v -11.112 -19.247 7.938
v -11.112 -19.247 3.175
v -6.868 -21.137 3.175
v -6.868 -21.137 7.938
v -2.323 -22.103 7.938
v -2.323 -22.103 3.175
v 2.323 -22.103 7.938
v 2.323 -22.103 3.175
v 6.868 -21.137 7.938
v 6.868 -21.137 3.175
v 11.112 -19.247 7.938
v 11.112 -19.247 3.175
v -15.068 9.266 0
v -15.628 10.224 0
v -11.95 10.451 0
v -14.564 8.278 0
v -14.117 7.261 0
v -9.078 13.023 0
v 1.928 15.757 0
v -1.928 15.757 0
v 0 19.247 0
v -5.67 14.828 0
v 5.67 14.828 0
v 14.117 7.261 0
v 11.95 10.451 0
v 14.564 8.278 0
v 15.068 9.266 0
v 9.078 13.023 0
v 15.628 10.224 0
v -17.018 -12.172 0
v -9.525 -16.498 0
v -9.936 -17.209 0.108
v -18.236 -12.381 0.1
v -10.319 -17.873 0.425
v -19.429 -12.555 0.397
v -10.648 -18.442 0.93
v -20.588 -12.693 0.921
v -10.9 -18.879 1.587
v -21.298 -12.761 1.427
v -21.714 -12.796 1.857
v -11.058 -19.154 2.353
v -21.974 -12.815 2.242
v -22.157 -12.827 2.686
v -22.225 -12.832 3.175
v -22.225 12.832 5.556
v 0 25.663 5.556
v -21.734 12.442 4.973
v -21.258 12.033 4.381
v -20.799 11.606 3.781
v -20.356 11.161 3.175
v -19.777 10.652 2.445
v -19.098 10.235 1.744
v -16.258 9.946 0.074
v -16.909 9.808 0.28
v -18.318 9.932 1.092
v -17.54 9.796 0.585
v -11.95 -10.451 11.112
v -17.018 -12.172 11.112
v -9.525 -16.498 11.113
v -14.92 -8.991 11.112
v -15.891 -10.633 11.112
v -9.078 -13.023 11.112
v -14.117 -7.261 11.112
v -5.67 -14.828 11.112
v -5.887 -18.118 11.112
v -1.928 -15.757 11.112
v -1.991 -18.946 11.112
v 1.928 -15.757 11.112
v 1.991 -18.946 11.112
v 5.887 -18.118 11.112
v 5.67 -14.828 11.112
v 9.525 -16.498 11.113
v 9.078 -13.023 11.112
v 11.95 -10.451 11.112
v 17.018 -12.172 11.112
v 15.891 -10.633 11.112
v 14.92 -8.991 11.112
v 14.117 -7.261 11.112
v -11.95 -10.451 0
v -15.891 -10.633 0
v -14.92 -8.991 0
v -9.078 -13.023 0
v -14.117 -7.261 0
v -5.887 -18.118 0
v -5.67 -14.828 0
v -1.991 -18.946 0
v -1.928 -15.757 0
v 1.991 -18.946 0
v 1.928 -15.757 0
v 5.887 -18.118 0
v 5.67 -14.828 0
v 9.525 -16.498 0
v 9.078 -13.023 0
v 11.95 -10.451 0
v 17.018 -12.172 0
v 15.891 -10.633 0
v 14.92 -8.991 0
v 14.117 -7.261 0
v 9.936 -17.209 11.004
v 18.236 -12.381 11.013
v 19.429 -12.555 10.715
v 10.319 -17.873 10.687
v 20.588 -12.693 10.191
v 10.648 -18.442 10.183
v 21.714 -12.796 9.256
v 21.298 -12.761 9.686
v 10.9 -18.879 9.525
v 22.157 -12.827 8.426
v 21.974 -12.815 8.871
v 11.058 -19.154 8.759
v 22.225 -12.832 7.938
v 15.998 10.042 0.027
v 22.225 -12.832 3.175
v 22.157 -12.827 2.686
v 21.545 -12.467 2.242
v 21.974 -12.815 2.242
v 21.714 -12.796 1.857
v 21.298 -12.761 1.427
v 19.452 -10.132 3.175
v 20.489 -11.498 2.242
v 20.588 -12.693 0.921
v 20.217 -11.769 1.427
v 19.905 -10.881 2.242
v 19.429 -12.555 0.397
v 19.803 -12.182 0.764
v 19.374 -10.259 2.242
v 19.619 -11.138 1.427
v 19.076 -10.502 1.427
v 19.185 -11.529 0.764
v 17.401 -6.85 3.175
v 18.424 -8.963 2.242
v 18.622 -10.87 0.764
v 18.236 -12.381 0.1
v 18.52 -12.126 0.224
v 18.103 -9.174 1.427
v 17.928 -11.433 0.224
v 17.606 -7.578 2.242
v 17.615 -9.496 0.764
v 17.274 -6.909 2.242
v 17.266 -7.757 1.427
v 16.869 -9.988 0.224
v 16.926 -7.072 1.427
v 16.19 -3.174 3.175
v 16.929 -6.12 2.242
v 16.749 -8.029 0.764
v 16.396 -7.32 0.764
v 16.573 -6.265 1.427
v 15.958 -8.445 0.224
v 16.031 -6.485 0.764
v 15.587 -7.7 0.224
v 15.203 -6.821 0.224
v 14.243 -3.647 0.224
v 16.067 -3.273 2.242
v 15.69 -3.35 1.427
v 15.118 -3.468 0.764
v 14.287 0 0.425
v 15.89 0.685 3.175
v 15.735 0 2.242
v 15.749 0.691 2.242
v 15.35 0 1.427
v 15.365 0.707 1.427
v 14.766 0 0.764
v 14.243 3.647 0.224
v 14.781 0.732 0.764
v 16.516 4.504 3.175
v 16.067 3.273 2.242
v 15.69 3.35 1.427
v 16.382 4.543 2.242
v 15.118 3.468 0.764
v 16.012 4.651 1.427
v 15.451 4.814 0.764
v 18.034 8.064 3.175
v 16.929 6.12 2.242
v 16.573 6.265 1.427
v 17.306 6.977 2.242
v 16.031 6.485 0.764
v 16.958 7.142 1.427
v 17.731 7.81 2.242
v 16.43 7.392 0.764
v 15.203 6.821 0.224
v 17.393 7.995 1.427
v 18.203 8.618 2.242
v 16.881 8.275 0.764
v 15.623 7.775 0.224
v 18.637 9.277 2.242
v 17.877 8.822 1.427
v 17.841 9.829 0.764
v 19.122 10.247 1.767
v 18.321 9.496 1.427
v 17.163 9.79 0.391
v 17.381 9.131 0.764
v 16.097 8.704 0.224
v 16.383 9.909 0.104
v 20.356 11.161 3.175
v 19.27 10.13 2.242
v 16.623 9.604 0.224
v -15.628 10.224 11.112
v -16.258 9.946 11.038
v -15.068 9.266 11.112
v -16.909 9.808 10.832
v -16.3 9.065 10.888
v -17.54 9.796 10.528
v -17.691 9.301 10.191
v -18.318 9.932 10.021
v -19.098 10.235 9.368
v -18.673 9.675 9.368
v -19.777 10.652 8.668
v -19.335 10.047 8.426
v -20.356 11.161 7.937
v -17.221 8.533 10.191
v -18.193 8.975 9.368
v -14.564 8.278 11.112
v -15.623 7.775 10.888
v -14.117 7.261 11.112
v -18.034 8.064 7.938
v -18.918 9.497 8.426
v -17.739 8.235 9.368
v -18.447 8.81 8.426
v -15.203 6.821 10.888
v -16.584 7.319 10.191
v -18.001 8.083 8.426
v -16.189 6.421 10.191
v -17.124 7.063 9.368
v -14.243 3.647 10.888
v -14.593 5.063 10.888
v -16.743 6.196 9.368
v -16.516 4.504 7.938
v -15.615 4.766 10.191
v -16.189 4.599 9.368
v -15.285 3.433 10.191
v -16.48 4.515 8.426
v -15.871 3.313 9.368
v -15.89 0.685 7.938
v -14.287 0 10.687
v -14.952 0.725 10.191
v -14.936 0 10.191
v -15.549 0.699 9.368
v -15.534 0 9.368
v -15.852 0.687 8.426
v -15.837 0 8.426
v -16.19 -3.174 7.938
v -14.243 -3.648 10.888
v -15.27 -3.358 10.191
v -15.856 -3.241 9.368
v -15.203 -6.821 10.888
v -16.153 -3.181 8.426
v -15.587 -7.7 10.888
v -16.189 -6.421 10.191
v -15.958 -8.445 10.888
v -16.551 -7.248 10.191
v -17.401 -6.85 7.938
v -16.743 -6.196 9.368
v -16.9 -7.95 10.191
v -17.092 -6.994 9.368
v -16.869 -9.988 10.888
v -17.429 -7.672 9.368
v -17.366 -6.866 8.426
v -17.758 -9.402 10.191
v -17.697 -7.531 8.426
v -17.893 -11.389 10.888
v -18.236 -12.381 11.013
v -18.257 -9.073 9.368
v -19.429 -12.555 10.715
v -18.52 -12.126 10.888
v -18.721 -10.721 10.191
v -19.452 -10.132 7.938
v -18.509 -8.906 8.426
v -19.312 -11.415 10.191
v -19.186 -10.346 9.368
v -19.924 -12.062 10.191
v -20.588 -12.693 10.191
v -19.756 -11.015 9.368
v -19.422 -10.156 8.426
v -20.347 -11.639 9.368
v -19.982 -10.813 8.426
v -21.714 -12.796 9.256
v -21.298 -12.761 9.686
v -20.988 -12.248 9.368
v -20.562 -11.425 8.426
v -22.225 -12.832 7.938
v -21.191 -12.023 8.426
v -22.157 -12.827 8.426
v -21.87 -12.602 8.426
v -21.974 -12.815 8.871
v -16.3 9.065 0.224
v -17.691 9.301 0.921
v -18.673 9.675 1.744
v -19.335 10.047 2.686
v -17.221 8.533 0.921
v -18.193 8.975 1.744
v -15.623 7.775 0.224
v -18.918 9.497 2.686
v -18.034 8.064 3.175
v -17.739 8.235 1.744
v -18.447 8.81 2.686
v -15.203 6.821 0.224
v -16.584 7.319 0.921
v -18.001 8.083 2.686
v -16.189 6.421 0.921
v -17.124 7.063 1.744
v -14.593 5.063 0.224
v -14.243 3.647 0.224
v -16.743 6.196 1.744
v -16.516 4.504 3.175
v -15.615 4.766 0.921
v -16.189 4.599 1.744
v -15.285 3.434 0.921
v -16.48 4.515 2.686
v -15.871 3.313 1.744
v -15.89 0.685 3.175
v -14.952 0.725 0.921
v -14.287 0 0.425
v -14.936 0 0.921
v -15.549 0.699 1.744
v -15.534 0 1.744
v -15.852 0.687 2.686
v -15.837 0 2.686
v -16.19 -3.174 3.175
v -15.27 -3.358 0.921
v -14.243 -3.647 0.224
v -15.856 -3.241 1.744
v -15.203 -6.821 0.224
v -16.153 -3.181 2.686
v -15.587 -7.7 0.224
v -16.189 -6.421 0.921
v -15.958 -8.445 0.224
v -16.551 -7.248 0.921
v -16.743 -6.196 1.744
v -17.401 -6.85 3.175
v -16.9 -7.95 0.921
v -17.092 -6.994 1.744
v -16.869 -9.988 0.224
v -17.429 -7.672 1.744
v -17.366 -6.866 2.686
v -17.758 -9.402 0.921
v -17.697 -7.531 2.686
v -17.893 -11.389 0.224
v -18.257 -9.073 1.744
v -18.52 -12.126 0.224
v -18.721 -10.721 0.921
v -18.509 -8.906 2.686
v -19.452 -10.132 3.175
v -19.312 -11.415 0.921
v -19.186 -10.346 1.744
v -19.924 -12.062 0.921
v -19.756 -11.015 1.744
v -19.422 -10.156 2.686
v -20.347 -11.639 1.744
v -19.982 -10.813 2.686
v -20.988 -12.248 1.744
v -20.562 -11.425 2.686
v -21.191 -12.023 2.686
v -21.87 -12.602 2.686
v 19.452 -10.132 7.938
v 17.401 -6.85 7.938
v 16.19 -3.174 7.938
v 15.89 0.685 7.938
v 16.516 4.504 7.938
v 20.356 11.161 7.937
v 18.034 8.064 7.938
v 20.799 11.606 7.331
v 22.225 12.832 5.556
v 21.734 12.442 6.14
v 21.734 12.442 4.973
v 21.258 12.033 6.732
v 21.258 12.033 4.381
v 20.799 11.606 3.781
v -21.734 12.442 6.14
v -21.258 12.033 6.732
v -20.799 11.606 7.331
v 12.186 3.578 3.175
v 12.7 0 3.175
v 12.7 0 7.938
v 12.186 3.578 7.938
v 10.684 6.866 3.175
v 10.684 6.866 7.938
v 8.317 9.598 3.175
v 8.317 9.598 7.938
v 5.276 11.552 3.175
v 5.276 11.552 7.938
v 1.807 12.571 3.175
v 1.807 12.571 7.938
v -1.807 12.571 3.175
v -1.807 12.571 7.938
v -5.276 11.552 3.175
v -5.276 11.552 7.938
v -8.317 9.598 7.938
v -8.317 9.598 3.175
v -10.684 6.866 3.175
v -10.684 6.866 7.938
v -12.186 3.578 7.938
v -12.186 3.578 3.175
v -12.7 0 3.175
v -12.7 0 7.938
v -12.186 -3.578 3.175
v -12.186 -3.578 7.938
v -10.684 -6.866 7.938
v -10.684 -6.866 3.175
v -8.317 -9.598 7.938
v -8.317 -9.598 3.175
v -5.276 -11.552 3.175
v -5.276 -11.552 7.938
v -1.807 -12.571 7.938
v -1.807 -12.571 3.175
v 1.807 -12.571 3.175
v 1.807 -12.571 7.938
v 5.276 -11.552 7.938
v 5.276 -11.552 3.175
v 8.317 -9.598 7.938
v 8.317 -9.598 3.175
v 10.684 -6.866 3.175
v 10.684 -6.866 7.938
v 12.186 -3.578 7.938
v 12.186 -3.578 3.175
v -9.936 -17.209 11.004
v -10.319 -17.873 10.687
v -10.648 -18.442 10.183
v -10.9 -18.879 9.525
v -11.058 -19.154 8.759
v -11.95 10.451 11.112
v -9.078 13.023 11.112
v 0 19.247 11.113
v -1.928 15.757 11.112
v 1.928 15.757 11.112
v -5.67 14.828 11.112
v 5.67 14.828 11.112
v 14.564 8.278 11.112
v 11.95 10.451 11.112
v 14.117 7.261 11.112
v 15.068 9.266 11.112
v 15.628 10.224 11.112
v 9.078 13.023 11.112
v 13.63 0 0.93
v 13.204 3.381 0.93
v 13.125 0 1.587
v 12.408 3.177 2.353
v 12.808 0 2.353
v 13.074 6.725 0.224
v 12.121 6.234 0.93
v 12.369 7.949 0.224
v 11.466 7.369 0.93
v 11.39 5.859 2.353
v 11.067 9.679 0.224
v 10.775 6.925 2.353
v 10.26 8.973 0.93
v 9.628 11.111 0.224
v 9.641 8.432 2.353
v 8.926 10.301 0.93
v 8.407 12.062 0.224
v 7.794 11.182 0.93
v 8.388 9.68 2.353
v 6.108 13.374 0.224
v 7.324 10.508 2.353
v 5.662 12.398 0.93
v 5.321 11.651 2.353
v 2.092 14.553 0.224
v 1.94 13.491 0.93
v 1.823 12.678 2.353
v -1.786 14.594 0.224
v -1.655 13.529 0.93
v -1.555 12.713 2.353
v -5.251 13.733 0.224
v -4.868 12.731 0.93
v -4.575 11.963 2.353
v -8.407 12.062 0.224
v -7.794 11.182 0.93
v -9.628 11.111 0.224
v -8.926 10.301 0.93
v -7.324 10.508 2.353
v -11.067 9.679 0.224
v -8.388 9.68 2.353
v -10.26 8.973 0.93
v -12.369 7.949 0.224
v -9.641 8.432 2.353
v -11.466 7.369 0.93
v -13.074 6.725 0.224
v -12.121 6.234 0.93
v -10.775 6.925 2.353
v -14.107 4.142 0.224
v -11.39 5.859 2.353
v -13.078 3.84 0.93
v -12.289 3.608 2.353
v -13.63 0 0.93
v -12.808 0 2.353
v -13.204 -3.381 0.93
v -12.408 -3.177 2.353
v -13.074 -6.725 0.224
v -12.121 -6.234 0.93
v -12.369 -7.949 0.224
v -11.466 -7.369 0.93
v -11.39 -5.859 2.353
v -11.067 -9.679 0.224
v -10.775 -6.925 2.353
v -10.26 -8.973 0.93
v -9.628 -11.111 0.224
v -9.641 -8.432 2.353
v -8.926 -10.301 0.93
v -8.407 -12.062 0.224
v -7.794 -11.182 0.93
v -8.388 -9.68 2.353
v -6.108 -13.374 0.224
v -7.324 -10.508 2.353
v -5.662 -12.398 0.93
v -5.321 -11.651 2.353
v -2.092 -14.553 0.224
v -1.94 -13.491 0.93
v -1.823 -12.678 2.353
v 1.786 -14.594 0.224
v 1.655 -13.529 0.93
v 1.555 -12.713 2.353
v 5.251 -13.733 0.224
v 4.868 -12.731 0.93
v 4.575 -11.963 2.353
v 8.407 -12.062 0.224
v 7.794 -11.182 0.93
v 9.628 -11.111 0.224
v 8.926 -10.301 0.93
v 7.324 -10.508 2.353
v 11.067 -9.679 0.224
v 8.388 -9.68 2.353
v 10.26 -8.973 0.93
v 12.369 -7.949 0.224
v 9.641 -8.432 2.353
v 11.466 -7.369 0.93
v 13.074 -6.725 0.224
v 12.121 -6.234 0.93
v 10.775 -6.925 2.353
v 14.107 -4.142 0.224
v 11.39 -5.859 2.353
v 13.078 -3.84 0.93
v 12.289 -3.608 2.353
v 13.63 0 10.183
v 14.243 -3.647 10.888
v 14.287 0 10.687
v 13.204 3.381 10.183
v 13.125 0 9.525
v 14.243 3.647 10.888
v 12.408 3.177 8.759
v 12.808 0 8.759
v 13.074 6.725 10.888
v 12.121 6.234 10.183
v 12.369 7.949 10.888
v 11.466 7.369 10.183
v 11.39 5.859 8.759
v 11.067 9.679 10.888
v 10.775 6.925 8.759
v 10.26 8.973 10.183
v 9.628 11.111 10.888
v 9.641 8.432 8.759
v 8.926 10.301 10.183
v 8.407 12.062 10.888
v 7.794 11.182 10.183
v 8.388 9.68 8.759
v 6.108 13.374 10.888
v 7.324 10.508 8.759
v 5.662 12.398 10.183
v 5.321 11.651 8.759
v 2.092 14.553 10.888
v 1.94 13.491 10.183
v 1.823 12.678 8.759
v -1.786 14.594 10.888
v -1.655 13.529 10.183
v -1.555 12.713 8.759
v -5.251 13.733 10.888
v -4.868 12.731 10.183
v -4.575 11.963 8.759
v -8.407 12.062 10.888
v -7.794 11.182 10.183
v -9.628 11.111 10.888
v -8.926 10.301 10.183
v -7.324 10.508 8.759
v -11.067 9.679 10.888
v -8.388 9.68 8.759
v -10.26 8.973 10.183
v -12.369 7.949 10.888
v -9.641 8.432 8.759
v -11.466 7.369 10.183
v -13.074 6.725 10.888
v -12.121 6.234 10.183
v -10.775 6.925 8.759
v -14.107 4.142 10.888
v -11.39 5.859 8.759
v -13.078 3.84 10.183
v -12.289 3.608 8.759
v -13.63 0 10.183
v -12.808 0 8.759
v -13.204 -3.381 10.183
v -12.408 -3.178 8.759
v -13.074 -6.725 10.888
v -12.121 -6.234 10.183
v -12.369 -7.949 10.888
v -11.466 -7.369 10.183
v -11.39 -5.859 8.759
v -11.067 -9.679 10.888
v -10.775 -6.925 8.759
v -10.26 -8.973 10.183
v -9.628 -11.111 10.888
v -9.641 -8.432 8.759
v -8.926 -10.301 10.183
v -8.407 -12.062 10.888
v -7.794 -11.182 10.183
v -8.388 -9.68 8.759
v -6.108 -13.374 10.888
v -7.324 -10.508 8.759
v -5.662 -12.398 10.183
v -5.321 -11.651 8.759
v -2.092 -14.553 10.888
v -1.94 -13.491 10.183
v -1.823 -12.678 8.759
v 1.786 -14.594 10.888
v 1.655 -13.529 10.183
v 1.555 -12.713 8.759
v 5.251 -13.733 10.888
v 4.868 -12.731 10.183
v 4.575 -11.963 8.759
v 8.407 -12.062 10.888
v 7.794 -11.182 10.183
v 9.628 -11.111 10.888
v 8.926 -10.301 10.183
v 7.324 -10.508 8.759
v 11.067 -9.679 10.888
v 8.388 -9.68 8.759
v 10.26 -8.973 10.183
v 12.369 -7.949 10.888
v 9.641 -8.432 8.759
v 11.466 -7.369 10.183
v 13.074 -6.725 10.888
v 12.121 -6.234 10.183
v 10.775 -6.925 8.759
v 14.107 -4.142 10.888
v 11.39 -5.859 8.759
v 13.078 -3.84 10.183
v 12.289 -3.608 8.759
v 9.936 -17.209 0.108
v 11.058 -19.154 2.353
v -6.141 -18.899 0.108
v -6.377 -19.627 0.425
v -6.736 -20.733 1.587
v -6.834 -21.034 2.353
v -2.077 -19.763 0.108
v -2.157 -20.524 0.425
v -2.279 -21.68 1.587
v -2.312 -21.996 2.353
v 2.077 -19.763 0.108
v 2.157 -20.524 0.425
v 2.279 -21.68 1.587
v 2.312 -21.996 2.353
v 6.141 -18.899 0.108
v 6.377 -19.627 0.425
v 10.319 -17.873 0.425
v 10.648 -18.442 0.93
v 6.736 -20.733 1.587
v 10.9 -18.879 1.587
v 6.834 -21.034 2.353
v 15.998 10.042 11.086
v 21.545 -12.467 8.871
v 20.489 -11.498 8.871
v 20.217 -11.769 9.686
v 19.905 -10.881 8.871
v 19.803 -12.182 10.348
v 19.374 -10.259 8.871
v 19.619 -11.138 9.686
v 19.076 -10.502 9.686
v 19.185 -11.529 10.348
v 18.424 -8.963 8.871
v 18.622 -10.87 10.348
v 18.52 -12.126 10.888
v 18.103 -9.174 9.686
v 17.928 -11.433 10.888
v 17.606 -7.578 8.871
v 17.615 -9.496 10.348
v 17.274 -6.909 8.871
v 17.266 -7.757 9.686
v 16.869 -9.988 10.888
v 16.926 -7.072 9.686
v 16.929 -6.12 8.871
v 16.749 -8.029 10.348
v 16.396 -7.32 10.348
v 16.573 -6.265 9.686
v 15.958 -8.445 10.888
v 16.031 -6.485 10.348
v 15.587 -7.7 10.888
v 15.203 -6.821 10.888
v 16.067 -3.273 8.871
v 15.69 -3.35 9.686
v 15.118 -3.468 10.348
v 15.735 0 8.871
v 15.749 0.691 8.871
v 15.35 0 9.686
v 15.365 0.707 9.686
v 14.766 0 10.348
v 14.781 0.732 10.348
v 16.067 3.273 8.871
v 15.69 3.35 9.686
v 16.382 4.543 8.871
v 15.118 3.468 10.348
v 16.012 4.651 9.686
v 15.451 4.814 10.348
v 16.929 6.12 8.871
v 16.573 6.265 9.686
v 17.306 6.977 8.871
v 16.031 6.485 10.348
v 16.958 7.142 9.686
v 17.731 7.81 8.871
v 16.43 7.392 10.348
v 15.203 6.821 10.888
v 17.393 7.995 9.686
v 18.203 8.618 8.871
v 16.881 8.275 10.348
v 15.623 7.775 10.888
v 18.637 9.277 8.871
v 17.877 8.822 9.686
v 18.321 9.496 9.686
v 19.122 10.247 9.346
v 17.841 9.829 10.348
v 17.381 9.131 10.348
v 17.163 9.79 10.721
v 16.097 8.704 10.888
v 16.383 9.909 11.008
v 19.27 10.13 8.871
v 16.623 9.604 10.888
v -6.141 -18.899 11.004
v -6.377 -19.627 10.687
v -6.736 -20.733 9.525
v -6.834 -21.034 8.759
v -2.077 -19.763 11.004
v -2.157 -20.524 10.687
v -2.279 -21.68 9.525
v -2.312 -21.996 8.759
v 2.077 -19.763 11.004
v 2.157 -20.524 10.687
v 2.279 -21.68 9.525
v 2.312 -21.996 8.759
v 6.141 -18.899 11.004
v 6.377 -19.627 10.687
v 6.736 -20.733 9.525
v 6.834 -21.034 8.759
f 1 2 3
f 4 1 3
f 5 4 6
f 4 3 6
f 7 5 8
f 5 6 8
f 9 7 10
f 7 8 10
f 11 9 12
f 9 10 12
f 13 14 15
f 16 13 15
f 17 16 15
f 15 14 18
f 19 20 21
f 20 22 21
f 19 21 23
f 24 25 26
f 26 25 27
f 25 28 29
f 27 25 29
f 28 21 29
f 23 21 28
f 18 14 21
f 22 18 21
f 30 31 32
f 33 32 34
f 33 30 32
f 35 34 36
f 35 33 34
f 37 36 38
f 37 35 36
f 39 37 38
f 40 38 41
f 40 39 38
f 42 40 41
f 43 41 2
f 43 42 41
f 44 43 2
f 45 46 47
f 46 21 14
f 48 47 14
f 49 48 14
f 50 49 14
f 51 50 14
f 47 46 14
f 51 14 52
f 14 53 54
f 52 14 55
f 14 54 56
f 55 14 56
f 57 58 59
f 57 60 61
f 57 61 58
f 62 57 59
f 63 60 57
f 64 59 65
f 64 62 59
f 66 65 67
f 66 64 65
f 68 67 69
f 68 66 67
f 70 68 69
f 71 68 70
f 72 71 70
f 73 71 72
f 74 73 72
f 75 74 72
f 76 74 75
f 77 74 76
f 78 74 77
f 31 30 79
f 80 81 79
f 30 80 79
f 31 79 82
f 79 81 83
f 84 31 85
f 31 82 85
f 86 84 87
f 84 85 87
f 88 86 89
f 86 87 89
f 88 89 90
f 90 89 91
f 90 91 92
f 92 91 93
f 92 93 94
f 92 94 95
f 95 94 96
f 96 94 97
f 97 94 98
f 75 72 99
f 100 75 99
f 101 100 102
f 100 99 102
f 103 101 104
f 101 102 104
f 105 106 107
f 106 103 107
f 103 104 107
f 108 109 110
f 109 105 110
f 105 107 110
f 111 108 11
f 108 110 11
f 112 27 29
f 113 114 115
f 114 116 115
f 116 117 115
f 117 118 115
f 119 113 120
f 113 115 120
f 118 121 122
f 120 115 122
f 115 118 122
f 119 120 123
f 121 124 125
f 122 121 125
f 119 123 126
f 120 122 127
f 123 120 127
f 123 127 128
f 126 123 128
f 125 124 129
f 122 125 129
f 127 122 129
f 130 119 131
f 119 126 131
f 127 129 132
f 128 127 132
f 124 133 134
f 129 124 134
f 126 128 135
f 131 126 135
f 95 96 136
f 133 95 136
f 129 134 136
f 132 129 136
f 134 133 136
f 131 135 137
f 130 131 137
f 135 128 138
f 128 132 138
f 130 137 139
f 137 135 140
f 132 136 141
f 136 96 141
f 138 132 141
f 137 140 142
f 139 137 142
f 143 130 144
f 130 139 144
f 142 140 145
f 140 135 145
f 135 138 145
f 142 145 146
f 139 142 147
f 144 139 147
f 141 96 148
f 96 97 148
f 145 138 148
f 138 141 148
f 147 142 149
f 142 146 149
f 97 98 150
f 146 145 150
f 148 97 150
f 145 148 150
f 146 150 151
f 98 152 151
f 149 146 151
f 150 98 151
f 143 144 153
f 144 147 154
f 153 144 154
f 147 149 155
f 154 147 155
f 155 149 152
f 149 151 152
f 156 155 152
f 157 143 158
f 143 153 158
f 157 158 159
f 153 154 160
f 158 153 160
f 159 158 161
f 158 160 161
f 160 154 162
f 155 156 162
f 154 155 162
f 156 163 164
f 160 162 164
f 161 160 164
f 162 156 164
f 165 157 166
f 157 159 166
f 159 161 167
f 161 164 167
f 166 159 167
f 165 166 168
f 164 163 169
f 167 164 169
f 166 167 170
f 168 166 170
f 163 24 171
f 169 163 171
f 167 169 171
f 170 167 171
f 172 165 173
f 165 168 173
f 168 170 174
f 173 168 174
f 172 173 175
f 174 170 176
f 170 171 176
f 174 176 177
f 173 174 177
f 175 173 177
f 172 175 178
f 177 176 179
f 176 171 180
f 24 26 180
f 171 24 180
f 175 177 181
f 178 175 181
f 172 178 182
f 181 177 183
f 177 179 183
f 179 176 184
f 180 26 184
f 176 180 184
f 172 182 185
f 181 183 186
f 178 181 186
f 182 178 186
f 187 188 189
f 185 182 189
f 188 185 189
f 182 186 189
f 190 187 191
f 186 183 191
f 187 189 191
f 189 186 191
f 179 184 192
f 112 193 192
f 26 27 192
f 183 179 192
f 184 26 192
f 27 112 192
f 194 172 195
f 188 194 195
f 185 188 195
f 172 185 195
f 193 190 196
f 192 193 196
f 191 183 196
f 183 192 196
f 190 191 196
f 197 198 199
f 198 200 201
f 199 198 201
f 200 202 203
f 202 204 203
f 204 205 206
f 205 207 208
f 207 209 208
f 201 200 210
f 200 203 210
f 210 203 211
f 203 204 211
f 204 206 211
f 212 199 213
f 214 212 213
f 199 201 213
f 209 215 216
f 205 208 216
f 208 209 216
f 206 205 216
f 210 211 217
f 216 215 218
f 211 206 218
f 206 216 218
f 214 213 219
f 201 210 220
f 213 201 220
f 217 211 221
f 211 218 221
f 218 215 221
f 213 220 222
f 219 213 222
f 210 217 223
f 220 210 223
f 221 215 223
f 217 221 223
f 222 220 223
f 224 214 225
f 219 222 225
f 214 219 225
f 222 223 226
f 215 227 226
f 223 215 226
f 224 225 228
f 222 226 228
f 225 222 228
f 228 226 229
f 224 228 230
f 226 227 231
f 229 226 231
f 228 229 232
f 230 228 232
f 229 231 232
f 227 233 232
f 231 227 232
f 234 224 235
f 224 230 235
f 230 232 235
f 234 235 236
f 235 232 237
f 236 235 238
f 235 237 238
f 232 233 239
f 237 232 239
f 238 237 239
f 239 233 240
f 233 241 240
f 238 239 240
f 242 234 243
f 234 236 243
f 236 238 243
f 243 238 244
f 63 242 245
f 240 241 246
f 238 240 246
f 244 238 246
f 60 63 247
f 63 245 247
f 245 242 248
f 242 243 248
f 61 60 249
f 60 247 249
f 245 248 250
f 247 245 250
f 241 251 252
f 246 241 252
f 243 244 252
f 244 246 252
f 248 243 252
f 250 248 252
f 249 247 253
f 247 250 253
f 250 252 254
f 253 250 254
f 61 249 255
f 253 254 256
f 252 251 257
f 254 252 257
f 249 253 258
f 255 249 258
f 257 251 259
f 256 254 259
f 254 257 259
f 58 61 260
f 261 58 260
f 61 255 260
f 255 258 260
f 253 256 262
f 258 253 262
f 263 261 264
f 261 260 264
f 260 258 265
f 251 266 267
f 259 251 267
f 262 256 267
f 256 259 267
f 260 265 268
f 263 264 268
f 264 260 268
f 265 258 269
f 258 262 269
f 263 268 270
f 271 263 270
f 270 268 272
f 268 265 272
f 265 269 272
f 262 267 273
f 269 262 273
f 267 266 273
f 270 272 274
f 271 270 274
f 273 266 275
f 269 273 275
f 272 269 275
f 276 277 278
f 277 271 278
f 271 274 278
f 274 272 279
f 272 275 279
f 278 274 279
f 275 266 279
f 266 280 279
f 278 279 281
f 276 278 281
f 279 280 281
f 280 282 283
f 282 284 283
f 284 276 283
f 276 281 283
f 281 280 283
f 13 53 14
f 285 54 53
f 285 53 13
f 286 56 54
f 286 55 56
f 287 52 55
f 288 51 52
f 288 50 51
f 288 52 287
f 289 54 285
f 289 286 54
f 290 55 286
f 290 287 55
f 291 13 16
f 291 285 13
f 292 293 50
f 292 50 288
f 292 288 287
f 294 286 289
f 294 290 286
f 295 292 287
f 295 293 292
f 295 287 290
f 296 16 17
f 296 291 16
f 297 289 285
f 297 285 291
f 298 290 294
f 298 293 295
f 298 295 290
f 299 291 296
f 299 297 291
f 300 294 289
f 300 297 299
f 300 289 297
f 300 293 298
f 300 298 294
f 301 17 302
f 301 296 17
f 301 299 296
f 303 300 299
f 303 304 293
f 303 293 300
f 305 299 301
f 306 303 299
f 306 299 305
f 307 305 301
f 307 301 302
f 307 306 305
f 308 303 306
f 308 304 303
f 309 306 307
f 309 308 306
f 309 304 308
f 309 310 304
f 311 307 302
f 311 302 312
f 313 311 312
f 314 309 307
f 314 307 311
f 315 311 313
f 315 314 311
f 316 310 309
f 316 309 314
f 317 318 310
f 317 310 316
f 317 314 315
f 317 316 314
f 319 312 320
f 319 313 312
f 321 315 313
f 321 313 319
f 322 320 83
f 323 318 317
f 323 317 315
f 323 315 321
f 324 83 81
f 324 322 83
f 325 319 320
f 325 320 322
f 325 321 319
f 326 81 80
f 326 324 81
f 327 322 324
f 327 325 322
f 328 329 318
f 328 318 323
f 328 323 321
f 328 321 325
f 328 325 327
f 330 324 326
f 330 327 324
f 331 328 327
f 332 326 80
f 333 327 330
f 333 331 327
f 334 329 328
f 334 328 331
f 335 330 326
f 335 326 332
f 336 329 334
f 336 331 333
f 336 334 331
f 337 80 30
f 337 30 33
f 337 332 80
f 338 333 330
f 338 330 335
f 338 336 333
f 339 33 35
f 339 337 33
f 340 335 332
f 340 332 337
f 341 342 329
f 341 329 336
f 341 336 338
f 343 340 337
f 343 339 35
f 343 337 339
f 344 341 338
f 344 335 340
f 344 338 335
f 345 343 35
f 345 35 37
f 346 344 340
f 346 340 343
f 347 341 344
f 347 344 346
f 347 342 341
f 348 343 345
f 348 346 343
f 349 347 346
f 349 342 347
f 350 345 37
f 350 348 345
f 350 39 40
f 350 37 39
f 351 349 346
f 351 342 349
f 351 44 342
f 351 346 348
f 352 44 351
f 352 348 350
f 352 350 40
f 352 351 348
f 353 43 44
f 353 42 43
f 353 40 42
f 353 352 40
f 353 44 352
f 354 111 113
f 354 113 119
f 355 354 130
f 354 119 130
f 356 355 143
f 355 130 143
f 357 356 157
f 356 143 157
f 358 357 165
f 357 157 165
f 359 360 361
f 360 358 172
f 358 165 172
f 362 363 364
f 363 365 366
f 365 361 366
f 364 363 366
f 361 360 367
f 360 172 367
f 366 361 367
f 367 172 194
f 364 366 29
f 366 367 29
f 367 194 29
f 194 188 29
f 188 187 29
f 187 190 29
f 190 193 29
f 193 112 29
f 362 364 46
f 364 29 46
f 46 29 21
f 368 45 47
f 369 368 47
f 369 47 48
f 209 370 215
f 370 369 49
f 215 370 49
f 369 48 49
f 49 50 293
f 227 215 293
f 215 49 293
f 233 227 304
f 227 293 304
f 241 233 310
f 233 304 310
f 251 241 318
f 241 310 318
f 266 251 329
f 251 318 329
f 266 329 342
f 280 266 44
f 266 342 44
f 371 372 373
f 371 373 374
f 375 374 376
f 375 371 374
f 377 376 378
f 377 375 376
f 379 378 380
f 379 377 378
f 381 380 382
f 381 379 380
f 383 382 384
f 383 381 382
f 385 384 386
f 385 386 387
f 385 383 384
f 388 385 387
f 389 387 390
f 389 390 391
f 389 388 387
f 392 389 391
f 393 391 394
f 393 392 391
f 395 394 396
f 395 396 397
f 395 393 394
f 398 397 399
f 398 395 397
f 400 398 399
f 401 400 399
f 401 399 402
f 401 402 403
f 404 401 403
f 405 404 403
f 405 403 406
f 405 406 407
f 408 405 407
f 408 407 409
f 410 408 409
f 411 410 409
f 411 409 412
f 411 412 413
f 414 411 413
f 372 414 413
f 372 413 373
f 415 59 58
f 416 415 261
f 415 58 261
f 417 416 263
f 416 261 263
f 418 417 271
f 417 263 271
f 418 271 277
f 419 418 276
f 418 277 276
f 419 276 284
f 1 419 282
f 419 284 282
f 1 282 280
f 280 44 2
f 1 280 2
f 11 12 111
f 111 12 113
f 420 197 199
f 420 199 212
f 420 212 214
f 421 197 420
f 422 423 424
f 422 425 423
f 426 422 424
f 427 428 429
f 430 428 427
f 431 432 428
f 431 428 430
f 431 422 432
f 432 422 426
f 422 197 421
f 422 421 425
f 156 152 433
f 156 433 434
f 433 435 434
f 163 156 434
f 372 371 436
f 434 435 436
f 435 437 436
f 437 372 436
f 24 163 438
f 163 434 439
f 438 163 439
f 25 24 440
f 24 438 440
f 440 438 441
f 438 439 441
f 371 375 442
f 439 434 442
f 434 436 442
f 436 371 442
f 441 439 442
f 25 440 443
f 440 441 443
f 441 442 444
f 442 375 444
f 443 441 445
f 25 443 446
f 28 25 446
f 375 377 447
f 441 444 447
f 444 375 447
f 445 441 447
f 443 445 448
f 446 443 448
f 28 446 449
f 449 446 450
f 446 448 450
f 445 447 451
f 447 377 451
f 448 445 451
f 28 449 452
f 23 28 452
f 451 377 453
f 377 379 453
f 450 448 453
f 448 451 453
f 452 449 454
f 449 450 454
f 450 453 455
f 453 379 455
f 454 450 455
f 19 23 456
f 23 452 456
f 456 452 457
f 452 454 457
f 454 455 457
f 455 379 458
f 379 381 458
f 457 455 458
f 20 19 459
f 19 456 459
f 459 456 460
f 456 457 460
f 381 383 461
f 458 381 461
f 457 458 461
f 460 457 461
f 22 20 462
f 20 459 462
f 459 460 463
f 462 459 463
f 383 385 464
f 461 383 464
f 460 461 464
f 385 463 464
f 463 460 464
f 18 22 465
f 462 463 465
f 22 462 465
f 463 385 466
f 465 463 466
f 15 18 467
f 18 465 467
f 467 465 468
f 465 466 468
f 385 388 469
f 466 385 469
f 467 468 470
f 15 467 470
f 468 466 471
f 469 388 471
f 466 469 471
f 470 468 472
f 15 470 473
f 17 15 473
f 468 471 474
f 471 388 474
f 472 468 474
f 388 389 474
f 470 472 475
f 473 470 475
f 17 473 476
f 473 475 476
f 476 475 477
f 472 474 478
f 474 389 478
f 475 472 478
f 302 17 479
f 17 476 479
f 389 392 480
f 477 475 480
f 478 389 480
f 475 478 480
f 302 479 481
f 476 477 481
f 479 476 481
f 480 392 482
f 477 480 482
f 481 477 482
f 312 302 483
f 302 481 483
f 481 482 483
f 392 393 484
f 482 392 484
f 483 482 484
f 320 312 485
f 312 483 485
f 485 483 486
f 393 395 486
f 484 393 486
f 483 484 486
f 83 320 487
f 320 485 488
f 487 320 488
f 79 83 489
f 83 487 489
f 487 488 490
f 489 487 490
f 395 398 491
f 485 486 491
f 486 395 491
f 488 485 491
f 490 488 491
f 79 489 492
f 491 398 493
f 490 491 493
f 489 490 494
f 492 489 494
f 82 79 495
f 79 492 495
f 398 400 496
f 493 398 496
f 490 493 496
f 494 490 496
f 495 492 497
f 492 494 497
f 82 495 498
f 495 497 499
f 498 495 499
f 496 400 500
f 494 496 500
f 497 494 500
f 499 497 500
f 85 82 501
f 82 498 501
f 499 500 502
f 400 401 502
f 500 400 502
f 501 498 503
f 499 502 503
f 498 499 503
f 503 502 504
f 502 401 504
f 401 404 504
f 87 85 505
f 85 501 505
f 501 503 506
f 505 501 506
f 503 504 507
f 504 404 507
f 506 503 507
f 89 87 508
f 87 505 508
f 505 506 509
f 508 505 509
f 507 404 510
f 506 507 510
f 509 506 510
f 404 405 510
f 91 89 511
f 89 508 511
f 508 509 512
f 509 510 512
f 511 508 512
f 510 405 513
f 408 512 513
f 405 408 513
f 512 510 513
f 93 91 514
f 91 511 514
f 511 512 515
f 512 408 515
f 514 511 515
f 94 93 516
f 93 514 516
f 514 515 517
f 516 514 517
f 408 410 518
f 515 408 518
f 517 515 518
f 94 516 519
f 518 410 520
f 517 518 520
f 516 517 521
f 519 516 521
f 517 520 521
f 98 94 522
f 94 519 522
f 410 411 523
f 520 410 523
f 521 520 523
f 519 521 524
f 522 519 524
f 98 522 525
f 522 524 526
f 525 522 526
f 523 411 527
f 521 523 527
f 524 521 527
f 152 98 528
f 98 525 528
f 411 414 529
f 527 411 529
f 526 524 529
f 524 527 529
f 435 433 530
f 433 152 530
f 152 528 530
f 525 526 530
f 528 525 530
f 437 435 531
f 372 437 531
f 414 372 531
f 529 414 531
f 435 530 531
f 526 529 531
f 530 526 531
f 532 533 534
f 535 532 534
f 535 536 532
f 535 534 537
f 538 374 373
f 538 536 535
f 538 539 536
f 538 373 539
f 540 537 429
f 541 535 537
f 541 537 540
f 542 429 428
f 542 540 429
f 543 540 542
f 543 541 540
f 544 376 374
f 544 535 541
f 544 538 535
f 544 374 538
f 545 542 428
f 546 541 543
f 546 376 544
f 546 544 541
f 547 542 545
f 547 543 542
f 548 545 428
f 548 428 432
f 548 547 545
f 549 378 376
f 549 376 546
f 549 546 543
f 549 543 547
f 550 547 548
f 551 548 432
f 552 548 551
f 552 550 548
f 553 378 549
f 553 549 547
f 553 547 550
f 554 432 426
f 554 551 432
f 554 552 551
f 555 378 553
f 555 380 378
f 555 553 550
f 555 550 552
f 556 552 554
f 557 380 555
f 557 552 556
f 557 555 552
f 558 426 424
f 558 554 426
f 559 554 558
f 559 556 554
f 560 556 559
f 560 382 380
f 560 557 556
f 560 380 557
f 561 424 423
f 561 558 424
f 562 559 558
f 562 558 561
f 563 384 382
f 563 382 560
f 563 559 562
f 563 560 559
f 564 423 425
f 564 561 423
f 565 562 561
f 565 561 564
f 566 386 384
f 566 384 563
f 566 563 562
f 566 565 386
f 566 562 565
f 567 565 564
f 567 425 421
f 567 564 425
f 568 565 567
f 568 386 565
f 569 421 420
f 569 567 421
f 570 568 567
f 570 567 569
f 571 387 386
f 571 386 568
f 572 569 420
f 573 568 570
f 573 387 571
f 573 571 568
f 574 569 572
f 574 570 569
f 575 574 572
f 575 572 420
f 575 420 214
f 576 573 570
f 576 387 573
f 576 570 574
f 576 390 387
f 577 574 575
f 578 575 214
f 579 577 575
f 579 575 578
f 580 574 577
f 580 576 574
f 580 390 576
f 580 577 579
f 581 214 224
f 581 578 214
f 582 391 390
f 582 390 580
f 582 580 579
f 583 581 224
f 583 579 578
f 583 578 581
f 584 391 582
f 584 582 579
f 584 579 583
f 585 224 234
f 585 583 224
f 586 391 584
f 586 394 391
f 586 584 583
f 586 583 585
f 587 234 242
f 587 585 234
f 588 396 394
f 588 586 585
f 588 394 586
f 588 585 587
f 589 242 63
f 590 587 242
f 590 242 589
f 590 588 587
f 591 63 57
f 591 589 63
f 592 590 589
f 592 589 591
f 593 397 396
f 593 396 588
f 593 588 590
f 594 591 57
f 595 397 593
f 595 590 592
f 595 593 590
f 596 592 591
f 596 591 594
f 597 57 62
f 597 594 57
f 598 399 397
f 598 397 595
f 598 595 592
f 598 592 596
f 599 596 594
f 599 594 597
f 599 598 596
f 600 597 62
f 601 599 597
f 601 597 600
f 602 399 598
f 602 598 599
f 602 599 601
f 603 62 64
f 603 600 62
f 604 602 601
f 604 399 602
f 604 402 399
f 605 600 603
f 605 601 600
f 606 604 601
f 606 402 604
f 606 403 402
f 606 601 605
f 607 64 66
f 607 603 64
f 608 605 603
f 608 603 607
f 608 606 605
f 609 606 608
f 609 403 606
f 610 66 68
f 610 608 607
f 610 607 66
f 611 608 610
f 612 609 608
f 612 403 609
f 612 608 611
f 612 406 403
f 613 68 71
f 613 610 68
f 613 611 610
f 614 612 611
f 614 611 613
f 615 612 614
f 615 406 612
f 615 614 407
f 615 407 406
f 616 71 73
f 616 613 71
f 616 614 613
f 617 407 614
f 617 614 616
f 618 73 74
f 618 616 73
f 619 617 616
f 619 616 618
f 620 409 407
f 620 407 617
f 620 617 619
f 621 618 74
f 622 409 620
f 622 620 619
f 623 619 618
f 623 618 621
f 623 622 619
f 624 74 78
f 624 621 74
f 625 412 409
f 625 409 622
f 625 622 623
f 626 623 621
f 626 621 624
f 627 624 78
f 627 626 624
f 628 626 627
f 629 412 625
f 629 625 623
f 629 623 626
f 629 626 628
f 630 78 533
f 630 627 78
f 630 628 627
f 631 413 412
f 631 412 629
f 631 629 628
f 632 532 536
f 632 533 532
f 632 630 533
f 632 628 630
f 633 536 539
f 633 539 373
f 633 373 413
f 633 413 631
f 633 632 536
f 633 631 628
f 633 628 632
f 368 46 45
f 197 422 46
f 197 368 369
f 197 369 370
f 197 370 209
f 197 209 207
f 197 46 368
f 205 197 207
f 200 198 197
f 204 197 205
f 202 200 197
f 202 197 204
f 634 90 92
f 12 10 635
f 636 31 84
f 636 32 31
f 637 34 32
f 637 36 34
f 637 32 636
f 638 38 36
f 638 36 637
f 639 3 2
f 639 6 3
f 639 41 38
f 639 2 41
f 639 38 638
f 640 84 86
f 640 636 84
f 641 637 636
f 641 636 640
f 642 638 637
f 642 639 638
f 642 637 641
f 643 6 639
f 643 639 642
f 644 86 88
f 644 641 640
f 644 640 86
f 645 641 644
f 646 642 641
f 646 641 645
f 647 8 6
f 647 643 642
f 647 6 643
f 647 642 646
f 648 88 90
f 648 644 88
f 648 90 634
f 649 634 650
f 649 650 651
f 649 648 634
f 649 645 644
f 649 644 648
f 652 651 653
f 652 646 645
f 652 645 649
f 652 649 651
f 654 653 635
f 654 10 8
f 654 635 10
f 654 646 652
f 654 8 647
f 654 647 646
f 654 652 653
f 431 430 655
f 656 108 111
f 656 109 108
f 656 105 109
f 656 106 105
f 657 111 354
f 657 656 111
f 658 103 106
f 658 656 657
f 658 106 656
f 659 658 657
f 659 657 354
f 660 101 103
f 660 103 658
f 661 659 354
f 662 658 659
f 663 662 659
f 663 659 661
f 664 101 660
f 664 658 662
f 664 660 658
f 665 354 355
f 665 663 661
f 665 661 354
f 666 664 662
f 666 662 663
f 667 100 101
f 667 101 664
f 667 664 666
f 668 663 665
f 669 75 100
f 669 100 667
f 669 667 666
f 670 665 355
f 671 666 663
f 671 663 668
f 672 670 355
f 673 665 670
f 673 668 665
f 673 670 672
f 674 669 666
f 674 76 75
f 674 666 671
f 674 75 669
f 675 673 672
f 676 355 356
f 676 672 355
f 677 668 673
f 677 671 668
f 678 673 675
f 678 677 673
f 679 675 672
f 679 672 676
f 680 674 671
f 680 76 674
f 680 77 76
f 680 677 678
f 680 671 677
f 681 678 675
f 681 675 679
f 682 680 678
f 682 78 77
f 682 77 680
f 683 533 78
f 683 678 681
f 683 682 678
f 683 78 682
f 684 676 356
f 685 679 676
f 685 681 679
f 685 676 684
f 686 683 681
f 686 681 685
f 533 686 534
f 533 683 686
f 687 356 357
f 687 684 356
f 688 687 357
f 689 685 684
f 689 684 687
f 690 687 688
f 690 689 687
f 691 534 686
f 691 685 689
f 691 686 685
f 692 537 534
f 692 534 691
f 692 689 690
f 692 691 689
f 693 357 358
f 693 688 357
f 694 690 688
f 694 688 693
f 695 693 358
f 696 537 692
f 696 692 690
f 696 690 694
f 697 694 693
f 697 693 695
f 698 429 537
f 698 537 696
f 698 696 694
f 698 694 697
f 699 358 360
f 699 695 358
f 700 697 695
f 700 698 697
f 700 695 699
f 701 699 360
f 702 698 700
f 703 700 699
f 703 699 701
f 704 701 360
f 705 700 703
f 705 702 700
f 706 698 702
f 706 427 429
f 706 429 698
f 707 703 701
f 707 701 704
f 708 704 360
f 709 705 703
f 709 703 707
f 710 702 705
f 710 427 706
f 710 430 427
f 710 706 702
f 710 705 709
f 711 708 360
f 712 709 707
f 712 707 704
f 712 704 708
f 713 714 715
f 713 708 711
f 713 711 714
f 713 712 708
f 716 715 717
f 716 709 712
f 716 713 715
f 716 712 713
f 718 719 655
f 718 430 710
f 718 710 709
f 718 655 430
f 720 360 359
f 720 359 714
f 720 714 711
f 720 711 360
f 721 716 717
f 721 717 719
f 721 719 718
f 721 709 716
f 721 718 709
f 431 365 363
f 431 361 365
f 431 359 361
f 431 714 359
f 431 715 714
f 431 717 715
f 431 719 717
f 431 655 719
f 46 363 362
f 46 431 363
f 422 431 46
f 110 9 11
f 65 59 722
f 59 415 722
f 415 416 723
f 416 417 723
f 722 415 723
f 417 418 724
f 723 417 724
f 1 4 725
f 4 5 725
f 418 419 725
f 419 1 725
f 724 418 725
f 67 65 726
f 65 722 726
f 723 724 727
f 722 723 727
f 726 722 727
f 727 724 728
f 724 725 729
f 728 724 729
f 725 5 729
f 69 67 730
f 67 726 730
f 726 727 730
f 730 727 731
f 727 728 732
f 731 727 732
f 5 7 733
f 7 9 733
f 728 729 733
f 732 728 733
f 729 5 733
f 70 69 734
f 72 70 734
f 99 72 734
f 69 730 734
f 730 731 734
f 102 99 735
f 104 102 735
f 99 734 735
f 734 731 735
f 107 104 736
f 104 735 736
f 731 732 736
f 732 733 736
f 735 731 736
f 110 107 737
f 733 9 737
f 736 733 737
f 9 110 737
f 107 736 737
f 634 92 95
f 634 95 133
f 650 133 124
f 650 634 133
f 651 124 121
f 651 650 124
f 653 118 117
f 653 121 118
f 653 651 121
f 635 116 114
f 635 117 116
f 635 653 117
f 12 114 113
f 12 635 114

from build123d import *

# Parameters (mm, degrees)
F0_R         = 12.7
F1_DEPTH     = 11.1125
F2_SIZE      = 5.55624
F3_T1_DEPTH  = 20.7691097327
F3_T3_DEPTH  = 20.7691097327
F3_T10_ANGLE = 141.384588939
F3_T12_ANGLE = 141.384588939
F3_T14_ANGLE = 60
F3_T16_ANGLE = 60
F3_T18_ANGLE = 141.384588939
F3_T20_ANGLE = 141.384588939


# Not quite as in the source:
# - a fillet or chamfer that OpenCascade refuses, or shapes differently, is made with other operations: its cross-section is extruded or revolved along the edge and cut away or added
# - a fillet or chamfer is up to 0.001 mm smaller than in the source, because OpenCascade refuses the exact size


with BuildPart() as f1:
    # F0 (on Top) → F1 (new body)
    with BuildSketch(Plane.XY):
        with BuildLine():
            Line((0, 25.6632194655), (-22.225, 12.8316097327))
            ThreePointArc((-22.225, 12.8316097327), (-15.875, 0), (-22.225, -12.8316097327))
            Line((-22.225, -12.8316097327), (-11.1125, -19.2474145991))
            ThreePointArc((-11.1125, -19.2474145991), (0, -22.225), (11.1125, -19.2474145991))
            Line((11.1125, -19.2474145991), (22.225, -12.8316097327))
            ThreePointArc((22.225, -12.8316097327), (15.875, 0), (22.225, 12.8316097327))
            Line((22.225, 12.8316097327), (0, 25.6632194655))
        make_face()
        Circle(F0_R, mode=Mode.SUBTRACT)
    extrude(amount=F1_DEPTH)

    # F2 (size 5.55625 in the source; OpenCascade refuses exactly that, so slightly less here)
    f2_edges = [f1.edges().sort_by_distance(p)[0] for p in [
        (11.1125, 19.247415, 0),
        (11.1125, 19.247415, 11.1125),
        (-11.1125, 19.247415, 11.1125),
        (-11.1125, 19.247415, 0),
    ]]
    chamfer(f2_edges, length=F2_SIZE)

    # F3: fillet of radius 3.175 on 13 edges, made by hand

    # F3_s2 → F3_t1 (cut)
    with BuildSketch(Plane(origin=(-17.9865766425, 10.3845548664, 0), x_dir=(0, 0, 1), z_dir=(0.8660254038, -0.5, 0))):
        with BuildLine():
            ThreePointArc((11.1125, 19.05), (10.1825640303, 21.2950640303), (7.9375, 22.225))
            Line((7.9375, 22.225), (11.1125, 22.225))
            Line((11.1125, 22.225), (11.1125, 19.05))
        make_face()
        with BuildLine():
            ThreePointArc((0, 19.05), (0.9299359697, 21.2950640303), (3.175, 22.225))
            Line((3.175, 22.225), (0, 22.225))
            Line((0, 22.225), (0, 19.05))
        make_face()
    extrude(amount=F3_T1_DEPTH, mode=Mode.SUBTRACT)

    # F3_s4 → F3_t3 (cut)
    with BuildSketch(Plane(origin=(0, 0, 0), x_dir=(0, 0, 1), z_dir=(0.8660254038, 0.5, 0))):
        with BuildLine():
            ThreePointArc((0, 19.05), (0.9299359697, 21.2950640303), (3.175, 22.225))
            Line((3.175, 22.225), (0, 22.225))
            Line((0, 22.225), (0, 19.05))
        make_face()
        with BuildLine():
            ThreePointArc((11.1125, 19.05), (10.1825640303, 21.2950640303), (7.9375, 22.225))
            Line((7.9375, 22.225), (11.1125, 22.225))
            Line((11.1125, 22.225), (11.1125, 19.05))
        make_face()
    extrude(amount=F3_T3_DEPTH, mode=Mode.SUBTRACT)

    # F3_s5 → F3_t6 (revolve, cut)
    with BuildSketch(Plane.XZ):
        with BuildLine():
            ThreePointArc((15.875, 0), (13.6299359697, 0.9299359697), (12.7, 3.175))
            Line((12.7, 3.175), (12.7, 0))
            Line((12.7, 0), (15.875, 0))
        make_face()
    revolve(axis=Axis((0, 0, 0), (0, 0, 1)), mode=Mode.SUBTRACT)

    # F3_s7 → F3_t8 (revolve, cut)
    with BuildSketch(Plane.XZ):
        with BuildLine():
            ThreePointArc((15.875, 11.1125), (13.6299359697, 10.1825640303), (12.7, 7.9375))
            Line((12.7, 7.9375), (12.7, 11.1125))
            Line((12.7, 11.1125), (15.875, 11.1125))
        make_face()
    revolve(axis=Axis((0, 0, 11.1125), (0, 0, 1)), mode=Mode.SUBTRACT)

    # F3_s9 → F3_t10 (revolve, cut)
    with BuildSketch(Plane(origin=(-24.2694814431, 13.7102008228, 0), x_dir=(0, 0, 1), z_dir=(-0.8706754951, 0.4918578882, 0))):
        with BuildLine():
            ThreePointArc((11.1125, 3.567957984), (10.1825640303, 1.3228939538), (7.9375, 0.392957984))
            Line((7.9375, 0.392957984), (11.1125, 0.392957984))
            Line((11.1125, 0.392957984), (11.1125, 3.567957984))
        make_face()
    revolve(axis=Axis((-32.0145833333, 0, 11.1125), (0, 0, -1)), revolution_arc=F3_T10_ANGLE, mode=Mode.SUBTRACT)

    # F3_s11 → F3_t12 (revolve, cut)
    with BuildSketch(Plane(origin=(-24.2694814431, 13.7102008228, 0), x_dir=(0, 0, 1), z_dir=(-0.8706754951, 0.4918578882, 0))):
        with BuildLine():
            ThreePointArc((0, 3.567957984), (0.9299359697, 1.3228939538), (3.175, 0.392957984))
            Line((3.175, 0.392957984), (0, 0.392957984))
            Line((0, 0.392957984), (0, 3.567957984))
        make_face()
    revolve(axis=Axis((-32.0145833333, 0, 0), (0, 0, -1)), revolution_arc=F3_T12_ANGLE, mode=Mode.SUBTRACT)

    # F3_s13 → F3_t14 (revolve, cut)
    with BuildSketch(Plane(origin=(0, 0, 0), x_dir=(0, 0, 1), z_dir=(-0.8660254038, 0.5, 0))):
        with BuildLine():
            ThreePointArc((11.1125, -19.05), (10.1825640303, -21.2950640303), (7.9375, -22.225))
            Line((7.9375, -22.225), (11.1125, -22.225))
            Line((11.1125, -22.225), (11.1125, -19.05))
        make_face()
    revolve(axis=Axis((0, 0, 11.1125), (0, 0, 1)), revolution_arc=F3_T14_ANGLE, mode=Mode.SUBTRACT)

    # F3_s15 → F3_t16 (revolve, cut)
    with BuildSketch(Plane(origin=(0, 0, 0), x_dir=(0, 0, 1), z_dir=(-0.8660254038, 0.5, 0))):
        with BuildLine():
            ThreePointArc((0, -19.05), (0.9299359697, -21.2950640303), (3.175, -22.225))
            Line((3.175, -22.225), (0, -22.225))
            Line((0, -22.225), (0, -19.05))
        make_face()
    revolve(axis=Axis((0, 0, 0), (0, 0, 1)), revolution_arc=F3_T16_ANGLE, mode=Mode.SUBTRACT)

    # F3_s17 → F3_t18 (revolve, cut)
    with BuildSketch(Plane(origin=(31.2045585083, -5.0275706902, 0), x_dir=(0, 0, 1), z_dir=(0.9872680765, -0.1590652226, 0))):
        with BuildLine():
            ThreePointArc((3.175, 11.0471765092), (0.9299359697, 11.977112479), (0, 14.2221765092))
            Line((0, 14.2221765092), (0, 11.0471765092))
            Line((0, 11.0471765092), (3.175, 11.0471765092))
        make_face()
    revolve(axis=Axis((32.0145833333, 0, 0), (0, 0, -1)), revolution_arc=F3_T18_ANGLE, mode=Mode.SUBTRACT)

    # F3_s19 → F3_t20 (revolve, cut)
    with BuildSketch(Plane(origin=(31.2045585083, -5.0275706902, 0), x_dir=(0, 0, 1), z_dir=(0.9872680765, -0.1590652226, 0))):
        with BuildLine():
            ThreePointArc((7.9375, 11.0471765092), (10.1825640303, 11.977112479), (11.1125, 14.2221765092))
            Line((11.1125, 14.2221765092), (11.1125, 11.0471765092))
            Line((11.1125, 11.0471765092), (7.9375, 11.0471765092))
        make_face()
    revolve(axis=Axis((32.0145833333, 0, 11.1125), (0, 0, -1)), revolution_arc=F3_T20_ANGLE, mode=Mode.SUBTRACT)


solid = f1.part
